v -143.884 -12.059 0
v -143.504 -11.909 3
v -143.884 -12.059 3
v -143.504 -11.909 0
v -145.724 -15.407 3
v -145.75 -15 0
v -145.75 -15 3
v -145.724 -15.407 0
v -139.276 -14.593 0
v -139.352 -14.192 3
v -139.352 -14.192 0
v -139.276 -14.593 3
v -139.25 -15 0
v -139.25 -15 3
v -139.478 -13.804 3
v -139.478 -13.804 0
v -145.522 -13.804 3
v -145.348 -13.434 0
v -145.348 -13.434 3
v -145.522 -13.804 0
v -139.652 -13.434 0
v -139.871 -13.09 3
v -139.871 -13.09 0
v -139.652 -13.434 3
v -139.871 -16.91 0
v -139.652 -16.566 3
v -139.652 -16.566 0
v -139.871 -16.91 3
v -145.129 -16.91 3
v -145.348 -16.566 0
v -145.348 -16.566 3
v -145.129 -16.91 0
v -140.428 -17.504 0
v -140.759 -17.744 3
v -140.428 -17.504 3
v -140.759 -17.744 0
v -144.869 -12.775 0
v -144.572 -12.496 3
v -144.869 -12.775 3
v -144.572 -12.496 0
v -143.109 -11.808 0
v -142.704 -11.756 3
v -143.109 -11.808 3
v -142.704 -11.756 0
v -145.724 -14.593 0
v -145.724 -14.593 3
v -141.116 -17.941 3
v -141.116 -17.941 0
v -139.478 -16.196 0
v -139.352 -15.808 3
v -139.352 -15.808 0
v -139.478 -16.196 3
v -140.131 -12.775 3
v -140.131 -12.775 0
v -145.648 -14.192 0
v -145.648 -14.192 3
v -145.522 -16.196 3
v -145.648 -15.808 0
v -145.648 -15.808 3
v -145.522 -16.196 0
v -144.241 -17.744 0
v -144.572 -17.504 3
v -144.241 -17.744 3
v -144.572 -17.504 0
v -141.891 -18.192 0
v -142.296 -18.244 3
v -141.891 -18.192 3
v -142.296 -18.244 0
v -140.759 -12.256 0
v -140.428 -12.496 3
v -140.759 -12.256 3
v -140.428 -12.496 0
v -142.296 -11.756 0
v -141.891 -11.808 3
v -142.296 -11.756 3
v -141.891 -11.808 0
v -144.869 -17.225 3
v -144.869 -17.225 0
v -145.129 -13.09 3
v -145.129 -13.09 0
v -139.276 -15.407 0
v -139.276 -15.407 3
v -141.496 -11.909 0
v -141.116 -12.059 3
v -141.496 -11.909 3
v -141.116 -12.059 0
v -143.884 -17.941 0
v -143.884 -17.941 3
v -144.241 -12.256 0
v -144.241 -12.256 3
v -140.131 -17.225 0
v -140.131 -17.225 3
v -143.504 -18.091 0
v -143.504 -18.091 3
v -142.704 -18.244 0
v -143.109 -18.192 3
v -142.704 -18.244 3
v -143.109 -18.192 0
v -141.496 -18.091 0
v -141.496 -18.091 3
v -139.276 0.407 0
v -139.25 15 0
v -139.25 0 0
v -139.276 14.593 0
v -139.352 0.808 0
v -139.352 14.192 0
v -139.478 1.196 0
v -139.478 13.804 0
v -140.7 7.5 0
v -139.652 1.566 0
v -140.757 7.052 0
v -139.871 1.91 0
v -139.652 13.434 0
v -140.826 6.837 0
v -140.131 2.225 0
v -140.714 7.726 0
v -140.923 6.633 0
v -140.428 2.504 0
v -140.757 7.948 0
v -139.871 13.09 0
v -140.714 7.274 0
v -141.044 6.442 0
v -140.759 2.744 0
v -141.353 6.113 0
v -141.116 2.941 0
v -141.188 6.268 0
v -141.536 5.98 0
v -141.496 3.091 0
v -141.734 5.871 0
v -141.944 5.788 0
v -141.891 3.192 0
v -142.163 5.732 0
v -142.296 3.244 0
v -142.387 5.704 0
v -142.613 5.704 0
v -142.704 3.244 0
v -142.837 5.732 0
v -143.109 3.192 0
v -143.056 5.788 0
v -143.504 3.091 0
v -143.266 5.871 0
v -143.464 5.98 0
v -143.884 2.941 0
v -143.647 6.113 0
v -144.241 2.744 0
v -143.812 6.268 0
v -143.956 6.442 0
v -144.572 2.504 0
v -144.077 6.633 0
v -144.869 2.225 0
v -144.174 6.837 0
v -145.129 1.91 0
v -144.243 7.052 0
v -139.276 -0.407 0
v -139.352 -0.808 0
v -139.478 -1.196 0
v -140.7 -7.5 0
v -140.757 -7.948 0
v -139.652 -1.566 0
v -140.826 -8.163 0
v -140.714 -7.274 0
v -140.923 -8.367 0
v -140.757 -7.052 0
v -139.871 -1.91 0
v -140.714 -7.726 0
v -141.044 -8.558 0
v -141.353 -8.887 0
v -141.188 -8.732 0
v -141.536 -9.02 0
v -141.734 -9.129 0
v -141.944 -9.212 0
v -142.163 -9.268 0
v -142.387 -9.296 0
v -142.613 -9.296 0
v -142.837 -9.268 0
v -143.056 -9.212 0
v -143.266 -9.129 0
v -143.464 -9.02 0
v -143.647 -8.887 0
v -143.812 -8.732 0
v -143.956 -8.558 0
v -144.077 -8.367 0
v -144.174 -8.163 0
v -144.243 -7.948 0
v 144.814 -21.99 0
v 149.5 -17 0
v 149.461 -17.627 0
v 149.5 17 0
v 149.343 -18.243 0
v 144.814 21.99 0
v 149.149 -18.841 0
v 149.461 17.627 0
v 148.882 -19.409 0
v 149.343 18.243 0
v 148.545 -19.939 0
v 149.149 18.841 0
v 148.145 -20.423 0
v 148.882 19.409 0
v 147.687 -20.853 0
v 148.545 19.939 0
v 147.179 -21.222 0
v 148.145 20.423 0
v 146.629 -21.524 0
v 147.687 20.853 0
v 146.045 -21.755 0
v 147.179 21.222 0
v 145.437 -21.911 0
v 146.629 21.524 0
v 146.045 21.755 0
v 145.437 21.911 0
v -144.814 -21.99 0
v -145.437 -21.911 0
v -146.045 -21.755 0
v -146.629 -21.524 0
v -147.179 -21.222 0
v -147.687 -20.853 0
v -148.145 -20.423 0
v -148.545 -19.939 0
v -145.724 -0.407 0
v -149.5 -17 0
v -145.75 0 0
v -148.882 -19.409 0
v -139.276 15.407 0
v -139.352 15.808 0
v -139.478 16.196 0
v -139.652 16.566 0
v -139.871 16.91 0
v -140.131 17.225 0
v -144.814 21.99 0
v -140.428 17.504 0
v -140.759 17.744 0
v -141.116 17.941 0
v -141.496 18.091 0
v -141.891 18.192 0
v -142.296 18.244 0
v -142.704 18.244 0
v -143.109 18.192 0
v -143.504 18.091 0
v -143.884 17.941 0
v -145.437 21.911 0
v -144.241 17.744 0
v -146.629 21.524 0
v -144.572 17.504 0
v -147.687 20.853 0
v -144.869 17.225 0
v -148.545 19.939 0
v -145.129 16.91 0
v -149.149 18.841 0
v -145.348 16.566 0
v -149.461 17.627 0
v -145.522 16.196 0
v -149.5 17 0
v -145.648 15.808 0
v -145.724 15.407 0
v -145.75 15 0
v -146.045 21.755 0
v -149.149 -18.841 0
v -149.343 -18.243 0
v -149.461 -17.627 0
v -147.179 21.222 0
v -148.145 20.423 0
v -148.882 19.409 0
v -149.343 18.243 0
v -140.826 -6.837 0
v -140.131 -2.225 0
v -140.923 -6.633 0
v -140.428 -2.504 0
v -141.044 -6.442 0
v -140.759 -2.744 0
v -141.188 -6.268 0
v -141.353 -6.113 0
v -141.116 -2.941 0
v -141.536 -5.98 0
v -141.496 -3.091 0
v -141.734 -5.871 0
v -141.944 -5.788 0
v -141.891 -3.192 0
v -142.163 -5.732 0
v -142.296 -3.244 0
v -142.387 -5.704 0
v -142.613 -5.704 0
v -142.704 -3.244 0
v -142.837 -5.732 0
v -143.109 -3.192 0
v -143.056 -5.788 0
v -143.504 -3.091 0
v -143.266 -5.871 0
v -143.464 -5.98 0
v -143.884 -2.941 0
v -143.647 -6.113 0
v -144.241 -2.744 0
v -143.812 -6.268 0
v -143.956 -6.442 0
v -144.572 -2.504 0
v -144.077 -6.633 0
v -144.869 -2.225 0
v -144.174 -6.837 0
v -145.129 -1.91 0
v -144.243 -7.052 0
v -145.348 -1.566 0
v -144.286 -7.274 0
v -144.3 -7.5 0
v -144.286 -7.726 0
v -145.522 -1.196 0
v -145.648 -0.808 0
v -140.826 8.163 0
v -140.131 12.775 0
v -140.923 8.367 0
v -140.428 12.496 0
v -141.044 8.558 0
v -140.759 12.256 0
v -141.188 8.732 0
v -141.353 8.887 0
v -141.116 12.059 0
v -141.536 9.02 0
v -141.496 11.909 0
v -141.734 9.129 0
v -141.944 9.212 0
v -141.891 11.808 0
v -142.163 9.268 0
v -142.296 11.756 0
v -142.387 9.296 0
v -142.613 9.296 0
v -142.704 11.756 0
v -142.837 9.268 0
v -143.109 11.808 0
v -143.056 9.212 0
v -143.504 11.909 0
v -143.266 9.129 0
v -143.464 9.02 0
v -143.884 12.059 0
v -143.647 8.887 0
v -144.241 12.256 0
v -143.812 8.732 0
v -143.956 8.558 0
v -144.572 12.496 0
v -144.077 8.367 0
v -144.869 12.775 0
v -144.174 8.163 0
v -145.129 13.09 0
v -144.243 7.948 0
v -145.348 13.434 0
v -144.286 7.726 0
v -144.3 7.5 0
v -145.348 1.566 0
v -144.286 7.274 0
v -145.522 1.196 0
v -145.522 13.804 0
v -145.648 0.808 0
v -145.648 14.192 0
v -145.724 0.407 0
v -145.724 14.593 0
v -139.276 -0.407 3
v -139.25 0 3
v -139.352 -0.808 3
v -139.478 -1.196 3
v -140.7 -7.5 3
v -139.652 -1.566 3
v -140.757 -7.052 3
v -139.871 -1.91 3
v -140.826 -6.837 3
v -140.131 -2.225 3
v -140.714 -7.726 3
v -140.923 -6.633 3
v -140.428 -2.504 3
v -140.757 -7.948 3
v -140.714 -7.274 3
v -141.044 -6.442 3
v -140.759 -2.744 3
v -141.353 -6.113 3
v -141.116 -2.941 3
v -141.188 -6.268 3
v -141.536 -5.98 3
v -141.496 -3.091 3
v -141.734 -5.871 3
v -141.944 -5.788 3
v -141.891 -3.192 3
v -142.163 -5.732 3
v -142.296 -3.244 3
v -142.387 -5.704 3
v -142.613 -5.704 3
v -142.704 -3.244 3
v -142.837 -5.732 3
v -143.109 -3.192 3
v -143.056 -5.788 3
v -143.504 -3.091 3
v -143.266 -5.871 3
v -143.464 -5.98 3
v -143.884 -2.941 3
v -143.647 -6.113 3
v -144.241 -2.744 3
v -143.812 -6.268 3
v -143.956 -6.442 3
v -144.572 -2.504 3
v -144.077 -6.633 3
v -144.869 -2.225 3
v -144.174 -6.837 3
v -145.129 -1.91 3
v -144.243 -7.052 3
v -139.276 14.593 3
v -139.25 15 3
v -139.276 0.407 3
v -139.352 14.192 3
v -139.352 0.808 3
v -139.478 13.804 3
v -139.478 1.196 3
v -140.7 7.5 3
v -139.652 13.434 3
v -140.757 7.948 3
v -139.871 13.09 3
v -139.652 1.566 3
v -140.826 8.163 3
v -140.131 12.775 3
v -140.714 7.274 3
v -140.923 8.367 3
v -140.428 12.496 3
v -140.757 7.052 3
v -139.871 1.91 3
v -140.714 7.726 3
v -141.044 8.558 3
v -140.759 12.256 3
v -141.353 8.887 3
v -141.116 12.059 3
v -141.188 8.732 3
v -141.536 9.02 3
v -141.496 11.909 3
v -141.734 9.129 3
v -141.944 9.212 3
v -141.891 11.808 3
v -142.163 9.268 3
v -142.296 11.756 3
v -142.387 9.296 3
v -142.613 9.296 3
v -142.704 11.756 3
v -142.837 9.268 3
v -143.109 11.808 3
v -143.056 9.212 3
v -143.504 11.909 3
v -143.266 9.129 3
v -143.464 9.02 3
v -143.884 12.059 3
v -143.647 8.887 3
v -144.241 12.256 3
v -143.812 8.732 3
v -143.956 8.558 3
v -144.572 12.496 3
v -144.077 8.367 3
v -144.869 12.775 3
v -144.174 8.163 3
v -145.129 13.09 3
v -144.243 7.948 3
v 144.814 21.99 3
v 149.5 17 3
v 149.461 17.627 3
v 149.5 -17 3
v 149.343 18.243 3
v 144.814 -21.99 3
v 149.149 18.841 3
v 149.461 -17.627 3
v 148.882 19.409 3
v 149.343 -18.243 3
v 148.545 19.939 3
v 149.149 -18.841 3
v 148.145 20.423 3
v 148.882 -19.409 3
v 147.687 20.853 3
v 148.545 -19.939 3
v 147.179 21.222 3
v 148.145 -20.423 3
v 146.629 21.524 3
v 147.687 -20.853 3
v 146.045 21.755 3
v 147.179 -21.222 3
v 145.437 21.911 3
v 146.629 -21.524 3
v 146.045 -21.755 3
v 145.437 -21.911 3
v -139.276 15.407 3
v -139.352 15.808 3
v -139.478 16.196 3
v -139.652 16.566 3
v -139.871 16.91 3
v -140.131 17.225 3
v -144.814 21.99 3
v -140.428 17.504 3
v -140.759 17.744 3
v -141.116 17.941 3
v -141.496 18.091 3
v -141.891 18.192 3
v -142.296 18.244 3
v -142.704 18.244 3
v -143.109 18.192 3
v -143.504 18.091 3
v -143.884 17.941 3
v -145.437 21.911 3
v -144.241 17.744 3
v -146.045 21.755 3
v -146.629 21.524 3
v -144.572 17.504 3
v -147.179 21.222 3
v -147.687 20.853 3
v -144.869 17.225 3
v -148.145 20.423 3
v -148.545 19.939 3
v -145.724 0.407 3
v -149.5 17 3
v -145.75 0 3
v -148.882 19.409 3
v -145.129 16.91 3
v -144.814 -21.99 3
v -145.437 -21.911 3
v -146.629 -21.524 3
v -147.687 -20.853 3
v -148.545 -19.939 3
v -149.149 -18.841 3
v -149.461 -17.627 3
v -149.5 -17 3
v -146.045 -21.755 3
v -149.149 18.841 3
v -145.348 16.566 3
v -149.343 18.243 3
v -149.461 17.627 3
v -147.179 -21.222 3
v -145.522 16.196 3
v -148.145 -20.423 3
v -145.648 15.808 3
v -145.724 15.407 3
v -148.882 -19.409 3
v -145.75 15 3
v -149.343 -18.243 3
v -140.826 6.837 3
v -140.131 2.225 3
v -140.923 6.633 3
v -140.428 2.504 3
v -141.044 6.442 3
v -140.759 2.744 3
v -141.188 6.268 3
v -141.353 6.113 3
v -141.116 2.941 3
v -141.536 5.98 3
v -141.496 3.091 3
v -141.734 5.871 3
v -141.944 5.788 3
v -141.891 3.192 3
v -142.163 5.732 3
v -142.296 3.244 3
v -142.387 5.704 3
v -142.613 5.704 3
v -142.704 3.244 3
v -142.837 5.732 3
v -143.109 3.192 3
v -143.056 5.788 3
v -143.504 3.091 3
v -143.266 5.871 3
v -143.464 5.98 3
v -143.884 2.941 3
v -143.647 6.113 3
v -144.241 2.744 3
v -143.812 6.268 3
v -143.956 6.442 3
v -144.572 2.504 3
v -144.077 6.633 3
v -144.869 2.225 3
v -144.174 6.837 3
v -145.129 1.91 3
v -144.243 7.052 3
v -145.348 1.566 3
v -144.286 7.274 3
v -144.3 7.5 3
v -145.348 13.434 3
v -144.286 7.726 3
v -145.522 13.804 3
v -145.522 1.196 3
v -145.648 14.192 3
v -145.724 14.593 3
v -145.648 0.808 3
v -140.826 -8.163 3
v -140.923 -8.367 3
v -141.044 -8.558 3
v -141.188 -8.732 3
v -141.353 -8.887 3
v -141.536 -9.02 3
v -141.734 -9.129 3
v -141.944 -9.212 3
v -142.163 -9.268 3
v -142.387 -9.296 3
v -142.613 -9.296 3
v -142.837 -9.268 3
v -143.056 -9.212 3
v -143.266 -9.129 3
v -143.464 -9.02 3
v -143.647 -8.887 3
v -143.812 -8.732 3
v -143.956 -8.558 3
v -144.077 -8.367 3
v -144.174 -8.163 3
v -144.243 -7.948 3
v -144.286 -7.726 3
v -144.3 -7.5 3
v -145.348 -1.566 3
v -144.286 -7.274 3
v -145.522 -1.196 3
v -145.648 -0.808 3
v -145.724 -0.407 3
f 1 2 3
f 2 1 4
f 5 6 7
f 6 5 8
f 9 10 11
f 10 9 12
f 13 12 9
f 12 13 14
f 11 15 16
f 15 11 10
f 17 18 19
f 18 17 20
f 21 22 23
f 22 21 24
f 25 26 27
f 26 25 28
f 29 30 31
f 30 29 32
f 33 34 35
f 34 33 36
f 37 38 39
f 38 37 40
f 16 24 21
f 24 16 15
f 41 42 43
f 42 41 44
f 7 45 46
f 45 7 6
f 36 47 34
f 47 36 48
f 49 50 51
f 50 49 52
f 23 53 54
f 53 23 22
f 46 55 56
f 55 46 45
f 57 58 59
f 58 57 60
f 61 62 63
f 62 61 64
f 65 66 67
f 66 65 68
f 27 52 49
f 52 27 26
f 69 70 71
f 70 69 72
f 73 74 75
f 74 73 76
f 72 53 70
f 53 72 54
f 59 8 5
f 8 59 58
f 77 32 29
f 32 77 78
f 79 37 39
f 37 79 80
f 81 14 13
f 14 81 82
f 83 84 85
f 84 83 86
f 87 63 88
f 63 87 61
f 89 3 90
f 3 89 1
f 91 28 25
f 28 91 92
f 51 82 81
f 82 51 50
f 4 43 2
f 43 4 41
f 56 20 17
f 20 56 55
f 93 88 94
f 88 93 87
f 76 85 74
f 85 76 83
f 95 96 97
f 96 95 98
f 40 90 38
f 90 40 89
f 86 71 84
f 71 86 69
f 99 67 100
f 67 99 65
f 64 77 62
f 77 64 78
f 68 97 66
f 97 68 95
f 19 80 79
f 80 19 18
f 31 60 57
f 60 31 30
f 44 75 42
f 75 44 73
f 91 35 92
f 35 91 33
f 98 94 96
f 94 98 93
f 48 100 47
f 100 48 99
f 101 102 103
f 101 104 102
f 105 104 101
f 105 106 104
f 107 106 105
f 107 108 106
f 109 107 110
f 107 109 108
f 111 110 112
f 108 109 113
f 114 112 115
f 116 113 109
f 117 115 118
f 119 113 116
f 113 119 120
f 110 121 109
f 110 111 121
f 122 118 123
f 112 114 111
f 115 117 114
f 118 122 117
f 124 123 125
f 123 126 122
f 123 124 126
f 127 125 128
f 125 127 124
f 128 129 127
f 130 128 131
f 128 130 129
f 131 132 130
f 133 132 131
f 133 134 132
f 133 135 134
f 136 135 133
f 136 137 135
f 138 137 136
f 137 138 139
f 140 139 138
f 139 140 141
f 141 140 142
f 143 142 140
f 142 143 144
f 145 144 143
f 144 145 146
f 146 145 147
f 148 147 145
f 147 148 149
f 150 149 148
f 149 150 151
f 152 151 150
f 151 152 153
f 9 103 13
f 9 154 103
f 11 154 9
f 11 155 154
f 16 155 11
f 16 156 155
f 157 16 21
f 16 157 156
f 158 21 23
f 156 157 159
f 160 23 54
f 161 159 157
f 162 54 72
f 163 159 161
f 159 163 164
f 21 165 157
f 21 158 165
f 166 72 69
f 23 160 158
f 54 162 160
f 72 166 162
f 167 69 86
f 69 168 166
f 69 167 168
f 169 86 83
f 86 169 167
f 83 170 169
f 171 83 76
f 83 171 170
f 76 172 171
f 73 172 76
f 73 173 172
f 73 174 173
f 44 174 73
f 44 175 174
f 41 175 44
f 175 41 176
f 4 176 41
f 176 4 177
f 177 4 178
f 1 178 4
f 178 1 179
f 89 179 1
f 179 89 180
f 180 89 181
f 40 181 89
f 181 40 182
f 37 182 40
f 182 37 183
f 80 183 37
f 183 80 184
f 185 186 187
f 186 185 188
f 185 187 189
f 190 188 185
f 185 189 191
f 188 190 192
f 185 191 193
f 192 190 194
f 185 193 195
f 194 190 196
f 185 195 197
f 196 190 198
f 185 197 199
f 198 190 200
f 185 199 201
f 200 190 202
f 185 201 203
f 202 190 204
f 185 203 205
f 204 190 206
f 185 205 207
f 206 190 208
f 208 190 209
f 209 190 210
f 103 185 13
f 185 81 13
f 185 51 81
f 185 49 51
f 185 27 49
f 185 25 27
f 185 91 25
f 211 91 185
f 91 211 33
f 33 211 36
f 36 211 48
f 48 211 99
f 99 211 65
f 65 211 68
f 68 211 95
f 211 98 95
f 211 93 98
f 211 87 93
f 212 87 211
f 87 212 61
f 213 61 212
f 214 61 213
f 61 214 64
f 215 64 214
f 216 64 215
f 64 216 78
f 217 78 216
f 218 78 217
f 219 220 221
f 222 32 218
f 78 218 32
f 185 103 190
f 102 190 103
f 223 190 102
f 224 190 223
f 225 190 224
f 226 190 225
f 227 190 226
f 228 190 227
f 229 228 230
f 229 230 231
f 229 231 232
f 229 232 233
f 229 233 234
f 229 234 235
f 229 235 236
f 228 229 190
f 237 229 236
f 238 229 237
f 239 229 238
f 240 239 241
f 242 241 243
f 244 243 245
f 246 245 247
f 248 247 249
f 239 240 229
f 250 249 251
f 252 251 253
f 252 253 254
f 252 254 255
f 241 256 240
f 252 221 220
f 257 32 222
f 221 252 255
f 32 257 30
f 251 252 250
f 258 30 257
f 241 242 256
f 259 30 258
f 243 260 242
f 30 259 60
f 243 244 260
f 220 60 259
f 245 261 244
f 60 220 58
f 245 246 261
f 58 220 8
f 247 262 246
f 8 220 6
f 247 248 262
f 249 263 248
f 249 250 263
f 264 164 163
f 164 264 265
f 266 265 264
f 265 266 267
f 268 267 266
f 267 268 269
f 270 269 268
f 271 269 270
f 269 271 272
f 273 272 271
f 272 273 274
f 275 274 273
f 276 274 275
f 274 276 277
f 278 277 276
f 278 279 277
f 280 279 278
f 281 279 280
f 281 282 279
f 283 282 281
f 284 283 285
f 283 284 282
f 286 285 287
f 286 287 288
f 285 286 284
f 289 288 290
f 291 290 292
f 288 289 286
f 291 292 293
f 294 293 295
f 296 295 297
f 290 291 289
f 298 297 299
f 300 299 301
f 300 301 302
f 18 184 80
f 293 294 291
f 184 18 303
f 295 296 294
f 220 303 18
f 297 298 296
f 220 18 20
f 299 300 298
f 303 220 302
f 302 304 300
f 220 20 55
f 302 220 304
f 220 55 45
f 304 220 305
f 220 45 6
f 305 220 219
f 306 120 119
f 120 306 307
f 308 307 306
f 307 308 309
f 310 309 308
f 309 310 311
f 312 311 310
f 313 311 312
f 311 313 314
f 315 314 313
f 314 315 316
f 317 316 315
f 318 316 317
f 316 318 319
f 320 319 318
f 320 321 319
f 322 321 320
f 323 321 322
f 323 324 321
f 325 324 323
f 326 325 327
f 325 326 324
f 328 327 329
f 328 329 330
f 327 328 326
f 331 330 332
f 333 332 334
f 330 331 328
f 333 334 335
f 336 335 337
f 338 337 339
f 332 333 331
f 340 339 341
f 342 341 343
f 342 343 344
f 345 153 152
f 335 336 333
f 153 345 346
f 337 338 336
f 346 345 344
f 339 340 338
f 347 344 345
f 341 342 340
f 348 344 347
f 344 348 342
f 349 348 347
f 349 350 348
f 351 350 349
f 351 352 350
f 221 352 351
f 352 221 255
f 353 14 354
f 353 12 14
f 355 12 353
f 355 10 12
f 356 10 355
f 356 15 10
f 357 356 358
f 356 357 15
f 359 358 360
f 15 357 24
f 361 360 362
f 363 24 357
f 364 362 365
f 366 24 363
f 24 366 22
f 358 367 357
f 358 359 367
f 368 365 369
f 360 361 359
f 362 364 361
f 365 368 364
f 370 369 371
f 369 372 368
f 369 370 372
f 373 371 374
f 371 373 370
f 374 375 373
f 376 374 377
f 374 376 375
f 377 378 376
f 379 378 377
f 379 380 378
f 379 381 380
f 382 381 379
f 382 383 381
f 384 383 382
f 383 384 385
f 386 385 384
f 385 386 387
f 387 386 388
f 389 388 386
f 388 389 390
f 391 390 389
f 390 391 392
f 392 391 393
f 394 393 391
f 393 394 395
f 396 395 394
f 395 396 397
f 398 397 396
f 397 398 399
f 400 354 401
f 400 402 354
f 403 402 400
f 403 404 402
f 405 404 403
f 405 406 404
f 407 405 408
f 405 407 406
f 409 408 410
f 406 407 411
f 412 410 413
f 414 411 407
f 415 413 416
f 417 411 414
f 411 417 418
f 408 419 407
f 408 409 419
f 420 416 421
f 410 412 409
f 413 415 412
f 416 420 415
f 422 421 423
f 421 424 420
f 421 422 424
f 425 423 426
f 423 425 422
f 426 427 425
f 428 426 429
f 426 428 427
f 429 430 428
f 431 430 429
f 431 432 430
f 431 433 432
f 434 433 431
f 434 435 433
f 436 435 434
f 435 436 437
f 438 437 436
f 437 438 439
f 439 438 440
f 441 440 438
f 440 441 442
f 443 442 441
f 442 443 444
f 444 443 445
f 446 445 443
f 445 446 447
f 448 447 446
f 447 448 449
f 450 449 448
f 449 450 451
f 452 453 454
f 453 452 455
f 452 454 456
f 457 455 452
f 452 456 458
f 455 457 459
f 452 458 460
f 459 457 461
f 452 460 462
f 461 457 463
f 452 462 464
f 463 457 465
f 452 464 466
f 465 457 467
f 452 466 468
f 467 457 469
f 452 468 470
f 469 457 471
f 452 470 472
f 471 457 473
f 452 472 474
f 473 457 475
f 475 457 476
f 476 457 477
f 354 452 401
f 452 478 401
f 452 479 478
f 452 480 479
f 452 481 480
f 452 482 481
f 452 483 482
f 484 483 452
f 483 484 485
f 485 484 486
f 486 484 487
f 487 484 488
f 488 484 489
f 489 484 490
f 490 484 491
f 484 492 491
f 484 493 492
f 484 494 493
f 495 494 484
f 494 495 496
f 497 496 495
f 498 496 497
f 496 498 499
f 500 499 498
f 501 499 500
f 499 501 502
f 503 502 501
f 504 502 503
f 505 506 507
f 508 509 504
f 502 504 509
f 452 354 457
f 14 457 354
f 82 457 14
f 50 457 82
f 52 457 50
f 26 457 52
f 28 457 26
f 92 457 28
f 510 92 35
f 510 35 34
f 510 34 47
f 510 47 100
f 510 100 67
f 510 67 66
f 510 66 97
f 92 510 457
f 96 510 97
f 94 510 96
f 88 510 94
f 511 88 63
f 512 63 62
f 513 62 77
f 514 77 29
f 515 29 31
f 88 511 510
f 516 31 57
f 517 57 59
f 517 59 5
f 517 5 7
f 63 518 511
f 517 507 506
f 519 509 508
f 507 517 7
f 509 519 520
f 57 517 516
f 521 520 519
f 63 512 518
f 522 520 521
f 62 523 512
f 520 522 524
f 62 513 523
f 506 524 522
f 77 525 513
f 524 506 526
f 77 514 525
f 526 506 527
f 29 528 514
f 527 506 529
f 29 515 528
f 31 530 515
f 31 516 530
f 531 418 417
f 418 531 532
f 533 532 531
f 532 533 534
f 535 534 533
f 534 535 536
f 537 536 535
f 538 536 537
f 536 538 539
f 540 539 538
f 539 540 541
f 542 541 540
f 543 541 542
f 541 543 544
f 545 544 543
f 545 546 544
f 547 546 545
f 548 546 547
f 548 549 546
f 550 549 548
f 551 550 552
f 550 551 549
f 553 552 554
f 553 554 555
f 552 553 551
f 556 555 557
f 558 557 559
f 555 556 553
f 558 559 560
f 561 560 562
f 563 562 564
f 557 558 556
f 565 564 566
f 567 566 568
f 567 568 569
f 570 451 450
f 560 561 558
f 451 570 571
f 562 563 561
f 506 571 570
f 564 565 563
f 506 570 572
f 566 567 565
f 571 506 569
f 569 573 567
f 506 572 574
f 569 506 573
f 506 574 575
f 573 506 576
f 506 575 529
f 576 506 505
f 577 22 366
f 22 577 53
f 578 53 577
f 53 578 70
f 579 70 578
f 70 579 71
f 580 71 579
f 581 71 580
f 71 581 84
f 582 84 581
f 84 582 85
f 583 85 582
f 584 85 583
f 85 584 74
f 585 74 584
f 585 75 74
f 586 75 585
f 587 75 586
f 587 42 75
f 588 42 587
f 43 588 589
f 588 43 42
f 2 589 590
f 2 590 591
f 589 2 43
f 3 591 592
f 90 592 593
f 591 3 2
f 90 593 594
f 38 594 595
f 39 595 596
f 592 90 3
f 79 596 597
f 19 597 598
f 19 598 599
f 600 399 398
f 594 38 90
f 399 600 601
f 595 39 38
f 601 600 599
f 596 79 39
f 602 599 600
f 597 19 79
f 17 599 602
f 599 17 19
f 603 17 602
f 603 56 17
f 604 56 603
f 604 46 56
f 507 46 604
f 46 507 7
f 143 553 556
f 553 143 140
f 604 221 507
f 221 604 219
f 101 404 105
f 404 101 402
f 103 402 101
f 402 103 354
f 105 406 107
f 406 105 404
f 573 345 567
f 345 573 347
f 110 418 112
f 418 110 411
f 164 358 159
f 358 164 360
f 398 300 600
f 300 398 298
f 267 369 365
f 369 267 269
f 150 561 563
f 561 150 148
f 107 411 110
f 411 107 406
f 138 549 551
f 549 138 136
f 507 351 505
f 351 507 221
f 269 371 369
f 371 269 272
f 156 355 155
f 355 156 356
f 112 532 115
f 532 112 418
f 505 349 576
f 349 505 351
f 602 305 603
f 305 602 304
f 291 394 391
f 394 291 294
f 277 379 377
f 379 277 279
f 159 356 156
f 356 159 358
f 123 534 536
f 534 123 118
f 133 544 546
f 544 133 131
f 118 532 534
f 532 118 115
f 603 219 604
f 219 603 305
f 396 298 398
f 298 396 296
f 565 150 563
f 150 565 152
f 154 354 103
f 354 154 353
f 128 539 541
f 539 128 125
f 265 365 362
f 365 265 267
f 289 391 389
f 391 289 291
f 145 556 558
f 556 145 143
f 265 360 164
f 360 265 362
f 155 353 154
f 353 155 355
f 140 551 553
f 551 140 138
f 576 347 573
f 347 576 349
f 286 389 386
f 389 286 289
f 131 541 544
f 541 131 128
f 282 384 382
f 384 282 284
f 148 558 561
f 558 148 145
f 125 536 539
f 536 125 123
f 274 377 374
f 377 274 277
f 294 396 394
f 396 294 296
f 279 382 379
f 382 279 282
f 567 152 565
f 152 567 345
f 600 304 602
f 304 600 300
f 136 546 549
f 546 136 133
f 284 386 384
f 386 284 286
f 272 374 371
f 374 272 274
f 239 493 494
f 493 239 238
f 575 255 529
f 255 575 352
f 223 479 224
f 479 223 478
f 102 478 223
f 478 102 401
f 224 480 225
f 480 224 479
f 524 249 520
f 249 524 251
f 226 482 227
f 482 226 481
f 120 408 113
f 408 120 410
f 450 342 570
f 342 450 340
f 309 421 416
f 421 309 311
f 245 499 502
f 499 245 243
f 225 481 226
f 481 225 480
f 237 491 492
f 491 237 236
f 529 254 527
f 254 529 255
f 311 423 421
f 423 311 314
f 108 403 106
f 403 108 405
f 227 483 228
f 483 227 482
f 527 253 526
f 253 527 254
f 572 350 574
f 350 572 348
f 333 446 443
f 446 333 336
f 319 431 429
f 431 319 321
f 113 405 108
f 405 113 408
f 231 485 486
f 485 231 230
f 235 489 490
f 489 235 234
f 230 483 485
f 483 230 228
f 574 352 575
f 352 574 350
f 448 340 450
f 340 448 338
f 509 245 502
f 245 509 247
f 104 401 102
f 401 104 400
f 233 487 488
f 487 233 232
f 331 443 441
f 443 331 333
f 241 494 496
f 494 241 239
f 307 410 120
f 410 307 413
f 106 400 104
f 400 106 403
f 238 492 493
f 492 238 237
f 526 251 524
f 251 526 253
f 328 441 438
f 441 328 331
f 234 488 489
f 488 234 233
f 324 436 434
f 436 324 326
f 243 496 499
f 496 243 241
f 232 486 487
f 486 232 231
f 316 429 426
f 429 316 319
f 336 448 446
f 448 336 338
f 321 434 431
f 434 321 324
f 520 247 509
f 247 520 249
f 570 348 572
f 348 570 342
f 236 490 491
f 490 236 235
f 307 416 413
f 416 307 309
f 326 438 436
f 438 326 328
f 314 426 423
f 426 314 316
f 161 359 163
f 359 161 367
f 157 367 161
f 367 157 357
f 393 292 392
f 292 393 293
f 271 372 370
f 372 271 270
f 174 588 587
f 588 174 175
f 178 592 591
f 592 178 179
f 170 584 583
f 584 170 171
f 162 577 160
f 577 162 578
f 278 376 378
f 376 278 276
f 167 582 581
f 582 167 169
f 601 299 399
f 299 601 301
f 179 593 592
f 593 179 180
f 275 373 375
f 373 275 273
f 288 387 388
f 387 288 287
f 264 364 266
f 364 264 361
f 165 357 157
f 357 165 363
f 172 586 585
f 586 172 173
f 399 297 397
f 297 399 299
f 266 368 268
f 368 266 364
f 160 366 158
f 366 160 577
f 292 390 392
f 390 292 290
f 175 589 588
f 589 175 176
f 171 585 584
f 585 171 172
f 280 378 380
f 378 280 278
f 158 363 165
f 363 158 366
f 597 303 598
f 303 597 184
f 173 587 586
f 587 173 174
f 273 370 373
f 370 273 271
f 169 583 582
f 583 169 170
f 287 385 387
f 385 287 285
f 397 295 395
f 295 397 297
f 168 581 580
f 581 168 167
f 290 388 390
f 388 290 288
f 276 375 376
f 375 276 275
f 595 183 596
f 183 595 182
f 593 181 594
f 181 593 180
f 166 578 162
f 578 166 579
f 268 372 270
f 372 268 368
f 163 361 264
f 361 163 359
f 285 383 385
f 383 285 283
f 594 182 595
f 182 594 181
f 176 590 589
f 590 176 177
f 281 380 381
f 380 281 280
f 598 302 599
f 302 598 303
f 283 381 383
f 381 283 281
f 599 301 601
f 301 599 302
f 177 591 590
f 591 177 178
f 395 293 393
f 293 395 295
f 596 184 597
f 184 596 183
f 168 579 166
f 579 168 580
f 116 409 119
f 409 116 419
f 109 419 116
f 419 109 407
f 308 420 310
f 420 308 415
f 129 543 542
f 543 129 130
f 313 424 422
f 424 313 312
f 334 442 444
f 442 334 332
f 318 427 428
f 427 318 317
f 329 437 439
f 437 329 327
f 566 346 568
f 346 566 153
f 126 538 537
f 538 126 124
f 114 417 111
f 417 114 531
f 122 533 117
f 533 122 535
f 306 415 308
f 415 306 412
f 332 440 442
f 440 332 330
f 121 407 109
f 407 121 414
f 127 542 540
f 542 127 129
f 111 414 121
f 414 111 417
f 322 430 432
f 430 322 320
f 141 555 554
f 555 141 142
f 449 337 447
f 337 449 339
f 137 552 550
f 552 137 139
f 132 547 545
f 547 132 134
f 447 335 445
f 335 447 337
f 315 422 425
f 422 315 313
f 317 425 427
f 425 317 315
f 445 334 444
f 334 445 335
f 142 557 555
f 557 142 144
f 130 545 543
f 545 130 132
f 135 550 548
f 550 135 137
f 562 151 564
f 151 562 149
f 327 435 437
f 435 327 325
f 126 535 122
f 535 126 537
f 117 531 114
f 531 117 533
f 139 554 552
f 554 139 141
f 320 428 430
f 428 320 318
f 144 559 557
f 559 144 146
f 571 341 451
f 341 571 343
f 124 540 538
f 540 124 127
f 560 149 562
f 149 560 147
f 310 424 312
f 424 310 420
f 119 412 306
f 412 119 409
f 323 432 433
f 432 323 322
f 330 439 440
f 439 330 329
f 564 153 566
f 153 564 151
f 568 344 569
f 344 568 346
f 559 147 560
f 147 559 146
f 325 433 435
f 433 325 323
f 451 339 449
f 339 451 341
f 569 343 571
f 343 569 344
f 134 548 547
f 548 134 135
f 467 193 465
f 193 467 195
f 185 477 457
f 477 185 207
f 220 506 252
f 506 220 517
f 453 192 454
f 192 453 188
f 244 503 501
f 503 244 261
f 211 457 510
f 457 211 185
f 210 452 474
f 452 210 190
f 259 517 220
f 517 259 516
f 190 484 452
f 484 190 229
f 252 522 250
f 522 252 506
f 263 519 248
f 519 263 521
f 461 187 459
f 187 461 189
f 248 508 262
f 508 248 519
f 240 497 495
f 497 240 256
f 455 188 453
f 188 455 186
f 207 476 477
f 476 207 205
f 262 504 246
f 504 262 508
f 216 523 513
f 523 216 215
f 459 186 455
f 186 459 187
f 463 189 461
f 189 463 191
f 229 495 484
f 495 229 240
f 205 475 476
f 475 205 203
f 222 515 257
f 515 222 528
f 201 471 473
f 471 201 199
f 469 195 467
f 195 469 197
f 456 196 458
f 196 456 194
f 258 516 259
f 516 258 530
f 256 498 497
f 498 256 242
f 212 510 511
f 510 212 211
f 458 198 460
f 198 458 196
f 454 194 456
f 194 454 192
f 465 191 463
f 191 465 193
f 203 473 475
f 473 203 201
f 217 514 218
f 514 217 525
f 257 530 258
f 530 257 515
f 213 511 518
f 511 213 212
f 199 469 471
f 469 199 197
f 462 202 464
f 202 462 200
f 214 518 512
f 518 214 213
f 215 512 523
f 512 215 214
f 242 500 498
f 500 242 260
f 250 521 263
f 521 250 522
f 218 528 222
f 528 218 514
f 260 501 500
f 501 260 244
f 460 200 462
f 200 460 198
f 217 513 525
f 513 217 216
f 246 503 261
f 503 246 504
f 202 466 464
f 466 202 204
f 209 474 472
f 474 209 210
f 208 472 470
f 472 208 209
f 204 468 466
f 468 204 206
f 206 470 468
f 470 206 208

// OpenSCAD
$fn = 50;


difference() {
	union() {
		hull() {
			translate(v = [-144.5000000000, 17.0000000000, 0]) {
				cylinder(h = 3, r = 5);
			}
			translate(v = [144.5000000000, 17.0000000000, 0]) {
				cylinder(h = 3, r = 5);
			}
			translate(v = [-144.5000000000, -17.0000000000, 0]) {
				cylinder(h = 3, r = 5);
			}
			translate(v = [144.5000000000, -17.0000000000, 0]) {
				cylinder(h = 3, r = 5);
			}
		}
	}
	union() {
		translate(v = [-142.5000000000, -15.0000000000, 0]) {
			cylinder(h = 3, r = 3.2500000000);
		}
		translate(v = [-142.5000000000, 0.0000000000, 0]) {
			cylinder(h = 3, r = 3.2500000000);
		}
		translate(v = [-142.5000000000, 15.0000000000, 0]) {
			cylinder(h = 3, r = 3.2500000000);
		}
		translate(v = [-142.5000000000, -15.0000000000, 0]) {
			cylinder(h = 3, r = 1.8000000000);
		}
		translate(v = [-142.5000000000, -7.5000000000, 0]) {
			cylinder(h = 3, r = 1.8000000000);
		}
		translate(v = [-142.5000000000, 0.0000000000, 0]) {
			cylinder(h = 3, r = 1.8000000000);
		}
		translate(v = [-142.5000000000, 7.5000000000, 0]) {
			cylinder(h = 3, r = 1.8000000000);
		}
		translate(v = [-142.5000000000, 15.0000000000, 0]) {
			cylinder(h = 3, r = 1.8000000000);
		}
		translate(v = [-142.5000000000, -15.0000000000, 0]) {
			cylinder(h = 3, r = 1.8000000000);
		}
		translate(v = [-142.5000000000, -7.5000000000, 0]) {
			cylinder(h = 3, r = 1.8000000000);
		}
		translate(v = [-142.5000000000, 0.0000000000, 0]) {
			cylinder(h = 3, r = 1.8000000000);
		}
		translate(v = [-142.5000000000, 7.5000000000, 0]) {
			cylinder(h = 3, r = 1.8000000000);
		}
		translate(v = [-142.5000000000, 15.0000000000, 0]) {
			cylinder(h = 3, r = 1.8000000000);
		}
		translate(v = [-142.5000000000, -15.0000000000, 0]) {
			cylinder(h = 3, r = 1.8000000000);
		}
		translate(v = [-142.5000000000, -7.5000000000, 0]) {
			cylinder(h = 3, r = 1.8000000000);
		}
		translate(v = [-142.5000000000, 0.0000000000, 0]) {
			cylinder(h = 3, r = 1.8000000000);
		}
		translate(v = [-142.5000000000, 7.5000000000, 0]) {
			cylinder(h = 3, r = 1.8000000000);
		}
		translate(v = [-142.5000000000, 15.0000000000, 0]) {
			cylinder(h = 3, r = 1.8000000000);
		}
	}
}
